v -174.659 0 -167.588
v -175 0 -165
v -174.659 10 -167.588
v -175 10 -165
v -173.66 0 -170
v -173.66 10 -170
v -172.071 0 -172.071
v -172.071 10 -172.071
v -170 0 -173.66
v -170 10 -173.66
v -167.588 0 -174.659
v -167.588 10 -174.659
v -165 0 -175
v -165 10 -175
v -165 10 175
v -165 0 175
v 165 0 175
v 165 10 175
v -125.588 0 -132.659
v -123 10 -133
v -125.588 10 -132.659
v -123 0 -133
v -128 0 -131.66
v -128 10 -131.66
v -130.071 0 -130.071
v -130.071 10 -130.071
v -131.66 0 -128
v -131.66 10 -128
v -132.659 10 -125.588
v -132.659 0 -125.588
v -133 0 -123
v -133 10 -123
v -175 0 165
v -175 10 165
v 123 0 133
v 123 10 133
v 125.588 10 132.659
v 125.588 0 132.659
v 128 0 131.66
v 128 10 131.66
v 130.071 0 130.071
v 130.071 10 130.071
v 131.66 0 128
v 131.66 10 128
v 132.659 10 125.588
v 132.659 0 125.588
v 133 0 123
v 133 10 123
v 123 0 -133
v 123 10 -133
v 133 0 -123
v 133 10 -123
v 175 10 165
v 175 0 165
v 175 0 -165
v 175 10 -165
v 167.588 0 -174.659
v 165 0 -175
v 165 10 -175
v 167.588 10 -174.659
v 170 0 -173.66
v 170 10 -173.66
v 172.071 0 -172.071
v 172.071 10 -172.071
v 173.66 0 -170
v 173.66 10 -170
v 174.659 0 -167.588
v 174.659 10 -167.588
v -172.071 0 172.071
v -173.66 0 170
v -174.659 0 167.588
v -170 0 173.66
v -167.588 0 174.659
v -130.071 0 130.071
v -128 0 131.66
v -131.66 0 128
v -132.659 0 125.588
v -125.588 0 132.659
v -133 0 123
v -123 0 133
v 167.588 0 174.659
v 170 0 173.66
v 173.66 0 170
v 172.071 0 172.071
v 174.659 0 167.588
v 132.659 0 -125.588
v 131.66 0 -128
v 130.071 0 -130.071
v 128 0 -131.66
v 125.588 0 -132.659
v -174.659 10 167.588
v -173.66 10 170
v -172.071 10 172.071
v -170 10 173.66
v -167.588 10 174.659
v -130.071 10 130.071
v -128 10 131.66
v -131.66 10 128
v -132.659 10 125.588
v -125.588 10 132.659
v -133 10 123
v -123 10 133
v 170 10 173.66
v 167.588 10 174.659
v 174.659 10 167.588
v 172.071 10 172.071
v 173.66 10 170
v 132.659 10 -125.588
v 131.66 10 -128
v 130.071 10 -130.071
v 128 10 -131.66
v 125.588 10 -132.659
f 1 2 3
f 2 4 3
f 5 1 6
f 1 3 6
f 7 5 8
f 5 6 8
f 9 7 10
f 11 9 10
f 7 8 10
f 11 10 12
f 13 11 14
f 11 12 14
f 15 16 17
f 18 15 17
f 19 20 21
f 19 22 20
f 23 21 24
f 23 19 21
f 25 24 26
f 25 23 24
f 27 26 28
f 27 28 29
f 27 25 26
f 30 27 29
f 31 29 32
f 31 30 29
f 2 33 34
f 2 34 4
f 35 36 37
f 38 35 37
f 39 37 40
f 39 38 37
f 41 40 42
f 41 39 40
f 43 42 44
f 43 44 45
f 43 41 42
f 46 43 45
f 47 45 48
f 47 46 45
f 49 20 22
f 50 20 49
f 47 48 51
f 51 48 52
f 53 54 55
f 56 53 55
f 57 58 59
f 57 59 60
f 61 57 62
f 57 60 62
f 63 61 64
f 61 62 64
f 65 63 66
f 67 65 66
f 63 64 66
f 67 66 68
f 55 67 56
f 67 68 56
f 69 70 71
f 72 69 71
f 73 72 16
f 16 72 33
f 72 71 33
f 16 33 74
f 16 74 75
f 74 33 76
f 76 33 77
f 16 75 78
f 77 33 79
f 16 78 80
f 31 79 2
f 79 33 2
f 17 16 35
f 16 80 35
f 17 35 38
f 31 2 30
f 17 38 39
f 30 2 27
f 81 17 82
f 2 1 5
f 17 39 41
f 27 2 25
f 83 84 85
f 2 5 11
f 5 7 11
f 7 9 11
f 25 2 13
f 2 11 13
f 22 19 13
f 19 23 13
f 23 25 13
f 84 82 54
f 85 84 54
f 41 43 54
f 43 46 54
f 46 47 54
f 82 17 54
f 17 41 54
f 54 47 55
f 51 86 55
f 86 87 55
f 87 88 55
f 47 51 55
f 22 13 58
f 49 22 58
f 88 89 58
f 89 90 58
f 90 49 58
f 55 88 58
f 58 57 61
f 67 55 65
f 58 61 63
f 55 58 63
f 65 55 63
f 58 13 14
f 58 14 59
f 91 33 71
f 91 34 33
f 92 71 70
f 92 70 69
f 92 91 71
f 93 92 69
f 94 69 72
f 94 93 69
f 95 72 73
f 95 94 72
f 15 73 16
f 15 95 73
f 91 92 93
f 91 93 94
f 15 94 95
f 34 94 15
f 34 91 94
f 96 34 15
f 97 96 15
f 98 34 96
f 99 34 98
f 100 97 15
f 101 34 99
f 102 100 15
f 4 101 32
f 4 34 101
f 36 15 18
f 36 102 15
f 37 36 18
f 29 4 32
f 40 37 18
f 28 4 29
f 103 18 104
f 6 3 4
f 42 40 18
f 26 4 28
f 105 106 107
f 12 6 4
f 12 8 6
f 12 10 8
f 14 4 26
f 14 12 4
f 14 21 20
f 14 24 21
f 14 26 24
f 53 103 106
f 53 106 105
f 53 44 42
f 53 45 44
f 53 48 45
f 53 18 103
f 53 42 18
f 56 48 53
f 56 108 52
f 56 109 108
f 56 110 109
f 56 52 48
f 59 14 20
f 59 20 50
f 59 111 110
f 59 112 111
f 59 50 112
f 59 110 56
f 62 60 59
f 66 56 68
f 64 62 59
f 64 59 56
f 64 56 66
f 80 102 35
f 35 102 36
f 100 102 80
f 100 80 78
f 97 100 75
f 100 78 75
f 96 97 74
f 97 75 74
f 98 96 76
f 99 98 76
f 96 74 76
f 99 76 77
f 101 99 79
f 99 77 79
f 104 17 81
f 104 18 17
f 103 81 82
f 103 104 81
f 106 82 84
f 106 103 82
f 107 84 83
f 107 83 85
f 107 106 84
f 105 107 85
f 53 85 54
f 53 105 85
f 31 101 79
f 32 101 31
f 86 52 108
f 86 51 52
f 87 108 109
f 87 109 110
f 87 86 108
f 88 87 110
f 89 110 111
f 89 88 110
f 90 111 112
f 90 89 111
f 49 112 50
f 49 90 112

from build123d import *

# Parameters (mm, degrees)
SKETCH1_W           = 350
SKETCH1_H           = 350
BOSS_EXTRUDE1_DEPTH = 10
SKETCH2_W           = 266
SKETCH2_H           = 266
CUT_EXTRUDE1_DEPTH  = 248.68932153
FILLET1_R           = 10


with BuildPart() as part:
    # Sketch1 → Boss-Extrude1 (new body)
    with BuildSketch(Plane(origin=(0, 0, 0), x_dir=(1, 0, 0), z_dir=(0, 1, 0))):
        Rectangle(SKETCH1_W, SKETCH1_H)
    extrude(amount=BOSS_EXTRUDE1_DEPTH)

    # Sketch2 → Cut-Extrude1 (cut, through all)
    with BuildSketch(Plane(origin=(0, 10, 0), x_dir=(1, 0, 0), z_dir=(0, 1, 0))):
        Rectangle(SKETCH2_W, SKETCH2_H)
    extrude(amount=-CUT_EXTRUDE1_DEPTH, mode=Mode.SUBTRACT)

    # Fillet1
    fillet1_edges = [part.edges().sort_by_distance(p)[0] for p in [
        (133, 5, -133),
        (133, 5, 133),
        (-133, 5, 133),
        (-133, 5, -133),
        (175, 5, 175),
        (-175, 5, 175),
        (-175, 5, -175),
        (175, 5, -175),
    ]]
    fillet(fillet1_edges, radius=FILLET1_R)


solid = part.part
